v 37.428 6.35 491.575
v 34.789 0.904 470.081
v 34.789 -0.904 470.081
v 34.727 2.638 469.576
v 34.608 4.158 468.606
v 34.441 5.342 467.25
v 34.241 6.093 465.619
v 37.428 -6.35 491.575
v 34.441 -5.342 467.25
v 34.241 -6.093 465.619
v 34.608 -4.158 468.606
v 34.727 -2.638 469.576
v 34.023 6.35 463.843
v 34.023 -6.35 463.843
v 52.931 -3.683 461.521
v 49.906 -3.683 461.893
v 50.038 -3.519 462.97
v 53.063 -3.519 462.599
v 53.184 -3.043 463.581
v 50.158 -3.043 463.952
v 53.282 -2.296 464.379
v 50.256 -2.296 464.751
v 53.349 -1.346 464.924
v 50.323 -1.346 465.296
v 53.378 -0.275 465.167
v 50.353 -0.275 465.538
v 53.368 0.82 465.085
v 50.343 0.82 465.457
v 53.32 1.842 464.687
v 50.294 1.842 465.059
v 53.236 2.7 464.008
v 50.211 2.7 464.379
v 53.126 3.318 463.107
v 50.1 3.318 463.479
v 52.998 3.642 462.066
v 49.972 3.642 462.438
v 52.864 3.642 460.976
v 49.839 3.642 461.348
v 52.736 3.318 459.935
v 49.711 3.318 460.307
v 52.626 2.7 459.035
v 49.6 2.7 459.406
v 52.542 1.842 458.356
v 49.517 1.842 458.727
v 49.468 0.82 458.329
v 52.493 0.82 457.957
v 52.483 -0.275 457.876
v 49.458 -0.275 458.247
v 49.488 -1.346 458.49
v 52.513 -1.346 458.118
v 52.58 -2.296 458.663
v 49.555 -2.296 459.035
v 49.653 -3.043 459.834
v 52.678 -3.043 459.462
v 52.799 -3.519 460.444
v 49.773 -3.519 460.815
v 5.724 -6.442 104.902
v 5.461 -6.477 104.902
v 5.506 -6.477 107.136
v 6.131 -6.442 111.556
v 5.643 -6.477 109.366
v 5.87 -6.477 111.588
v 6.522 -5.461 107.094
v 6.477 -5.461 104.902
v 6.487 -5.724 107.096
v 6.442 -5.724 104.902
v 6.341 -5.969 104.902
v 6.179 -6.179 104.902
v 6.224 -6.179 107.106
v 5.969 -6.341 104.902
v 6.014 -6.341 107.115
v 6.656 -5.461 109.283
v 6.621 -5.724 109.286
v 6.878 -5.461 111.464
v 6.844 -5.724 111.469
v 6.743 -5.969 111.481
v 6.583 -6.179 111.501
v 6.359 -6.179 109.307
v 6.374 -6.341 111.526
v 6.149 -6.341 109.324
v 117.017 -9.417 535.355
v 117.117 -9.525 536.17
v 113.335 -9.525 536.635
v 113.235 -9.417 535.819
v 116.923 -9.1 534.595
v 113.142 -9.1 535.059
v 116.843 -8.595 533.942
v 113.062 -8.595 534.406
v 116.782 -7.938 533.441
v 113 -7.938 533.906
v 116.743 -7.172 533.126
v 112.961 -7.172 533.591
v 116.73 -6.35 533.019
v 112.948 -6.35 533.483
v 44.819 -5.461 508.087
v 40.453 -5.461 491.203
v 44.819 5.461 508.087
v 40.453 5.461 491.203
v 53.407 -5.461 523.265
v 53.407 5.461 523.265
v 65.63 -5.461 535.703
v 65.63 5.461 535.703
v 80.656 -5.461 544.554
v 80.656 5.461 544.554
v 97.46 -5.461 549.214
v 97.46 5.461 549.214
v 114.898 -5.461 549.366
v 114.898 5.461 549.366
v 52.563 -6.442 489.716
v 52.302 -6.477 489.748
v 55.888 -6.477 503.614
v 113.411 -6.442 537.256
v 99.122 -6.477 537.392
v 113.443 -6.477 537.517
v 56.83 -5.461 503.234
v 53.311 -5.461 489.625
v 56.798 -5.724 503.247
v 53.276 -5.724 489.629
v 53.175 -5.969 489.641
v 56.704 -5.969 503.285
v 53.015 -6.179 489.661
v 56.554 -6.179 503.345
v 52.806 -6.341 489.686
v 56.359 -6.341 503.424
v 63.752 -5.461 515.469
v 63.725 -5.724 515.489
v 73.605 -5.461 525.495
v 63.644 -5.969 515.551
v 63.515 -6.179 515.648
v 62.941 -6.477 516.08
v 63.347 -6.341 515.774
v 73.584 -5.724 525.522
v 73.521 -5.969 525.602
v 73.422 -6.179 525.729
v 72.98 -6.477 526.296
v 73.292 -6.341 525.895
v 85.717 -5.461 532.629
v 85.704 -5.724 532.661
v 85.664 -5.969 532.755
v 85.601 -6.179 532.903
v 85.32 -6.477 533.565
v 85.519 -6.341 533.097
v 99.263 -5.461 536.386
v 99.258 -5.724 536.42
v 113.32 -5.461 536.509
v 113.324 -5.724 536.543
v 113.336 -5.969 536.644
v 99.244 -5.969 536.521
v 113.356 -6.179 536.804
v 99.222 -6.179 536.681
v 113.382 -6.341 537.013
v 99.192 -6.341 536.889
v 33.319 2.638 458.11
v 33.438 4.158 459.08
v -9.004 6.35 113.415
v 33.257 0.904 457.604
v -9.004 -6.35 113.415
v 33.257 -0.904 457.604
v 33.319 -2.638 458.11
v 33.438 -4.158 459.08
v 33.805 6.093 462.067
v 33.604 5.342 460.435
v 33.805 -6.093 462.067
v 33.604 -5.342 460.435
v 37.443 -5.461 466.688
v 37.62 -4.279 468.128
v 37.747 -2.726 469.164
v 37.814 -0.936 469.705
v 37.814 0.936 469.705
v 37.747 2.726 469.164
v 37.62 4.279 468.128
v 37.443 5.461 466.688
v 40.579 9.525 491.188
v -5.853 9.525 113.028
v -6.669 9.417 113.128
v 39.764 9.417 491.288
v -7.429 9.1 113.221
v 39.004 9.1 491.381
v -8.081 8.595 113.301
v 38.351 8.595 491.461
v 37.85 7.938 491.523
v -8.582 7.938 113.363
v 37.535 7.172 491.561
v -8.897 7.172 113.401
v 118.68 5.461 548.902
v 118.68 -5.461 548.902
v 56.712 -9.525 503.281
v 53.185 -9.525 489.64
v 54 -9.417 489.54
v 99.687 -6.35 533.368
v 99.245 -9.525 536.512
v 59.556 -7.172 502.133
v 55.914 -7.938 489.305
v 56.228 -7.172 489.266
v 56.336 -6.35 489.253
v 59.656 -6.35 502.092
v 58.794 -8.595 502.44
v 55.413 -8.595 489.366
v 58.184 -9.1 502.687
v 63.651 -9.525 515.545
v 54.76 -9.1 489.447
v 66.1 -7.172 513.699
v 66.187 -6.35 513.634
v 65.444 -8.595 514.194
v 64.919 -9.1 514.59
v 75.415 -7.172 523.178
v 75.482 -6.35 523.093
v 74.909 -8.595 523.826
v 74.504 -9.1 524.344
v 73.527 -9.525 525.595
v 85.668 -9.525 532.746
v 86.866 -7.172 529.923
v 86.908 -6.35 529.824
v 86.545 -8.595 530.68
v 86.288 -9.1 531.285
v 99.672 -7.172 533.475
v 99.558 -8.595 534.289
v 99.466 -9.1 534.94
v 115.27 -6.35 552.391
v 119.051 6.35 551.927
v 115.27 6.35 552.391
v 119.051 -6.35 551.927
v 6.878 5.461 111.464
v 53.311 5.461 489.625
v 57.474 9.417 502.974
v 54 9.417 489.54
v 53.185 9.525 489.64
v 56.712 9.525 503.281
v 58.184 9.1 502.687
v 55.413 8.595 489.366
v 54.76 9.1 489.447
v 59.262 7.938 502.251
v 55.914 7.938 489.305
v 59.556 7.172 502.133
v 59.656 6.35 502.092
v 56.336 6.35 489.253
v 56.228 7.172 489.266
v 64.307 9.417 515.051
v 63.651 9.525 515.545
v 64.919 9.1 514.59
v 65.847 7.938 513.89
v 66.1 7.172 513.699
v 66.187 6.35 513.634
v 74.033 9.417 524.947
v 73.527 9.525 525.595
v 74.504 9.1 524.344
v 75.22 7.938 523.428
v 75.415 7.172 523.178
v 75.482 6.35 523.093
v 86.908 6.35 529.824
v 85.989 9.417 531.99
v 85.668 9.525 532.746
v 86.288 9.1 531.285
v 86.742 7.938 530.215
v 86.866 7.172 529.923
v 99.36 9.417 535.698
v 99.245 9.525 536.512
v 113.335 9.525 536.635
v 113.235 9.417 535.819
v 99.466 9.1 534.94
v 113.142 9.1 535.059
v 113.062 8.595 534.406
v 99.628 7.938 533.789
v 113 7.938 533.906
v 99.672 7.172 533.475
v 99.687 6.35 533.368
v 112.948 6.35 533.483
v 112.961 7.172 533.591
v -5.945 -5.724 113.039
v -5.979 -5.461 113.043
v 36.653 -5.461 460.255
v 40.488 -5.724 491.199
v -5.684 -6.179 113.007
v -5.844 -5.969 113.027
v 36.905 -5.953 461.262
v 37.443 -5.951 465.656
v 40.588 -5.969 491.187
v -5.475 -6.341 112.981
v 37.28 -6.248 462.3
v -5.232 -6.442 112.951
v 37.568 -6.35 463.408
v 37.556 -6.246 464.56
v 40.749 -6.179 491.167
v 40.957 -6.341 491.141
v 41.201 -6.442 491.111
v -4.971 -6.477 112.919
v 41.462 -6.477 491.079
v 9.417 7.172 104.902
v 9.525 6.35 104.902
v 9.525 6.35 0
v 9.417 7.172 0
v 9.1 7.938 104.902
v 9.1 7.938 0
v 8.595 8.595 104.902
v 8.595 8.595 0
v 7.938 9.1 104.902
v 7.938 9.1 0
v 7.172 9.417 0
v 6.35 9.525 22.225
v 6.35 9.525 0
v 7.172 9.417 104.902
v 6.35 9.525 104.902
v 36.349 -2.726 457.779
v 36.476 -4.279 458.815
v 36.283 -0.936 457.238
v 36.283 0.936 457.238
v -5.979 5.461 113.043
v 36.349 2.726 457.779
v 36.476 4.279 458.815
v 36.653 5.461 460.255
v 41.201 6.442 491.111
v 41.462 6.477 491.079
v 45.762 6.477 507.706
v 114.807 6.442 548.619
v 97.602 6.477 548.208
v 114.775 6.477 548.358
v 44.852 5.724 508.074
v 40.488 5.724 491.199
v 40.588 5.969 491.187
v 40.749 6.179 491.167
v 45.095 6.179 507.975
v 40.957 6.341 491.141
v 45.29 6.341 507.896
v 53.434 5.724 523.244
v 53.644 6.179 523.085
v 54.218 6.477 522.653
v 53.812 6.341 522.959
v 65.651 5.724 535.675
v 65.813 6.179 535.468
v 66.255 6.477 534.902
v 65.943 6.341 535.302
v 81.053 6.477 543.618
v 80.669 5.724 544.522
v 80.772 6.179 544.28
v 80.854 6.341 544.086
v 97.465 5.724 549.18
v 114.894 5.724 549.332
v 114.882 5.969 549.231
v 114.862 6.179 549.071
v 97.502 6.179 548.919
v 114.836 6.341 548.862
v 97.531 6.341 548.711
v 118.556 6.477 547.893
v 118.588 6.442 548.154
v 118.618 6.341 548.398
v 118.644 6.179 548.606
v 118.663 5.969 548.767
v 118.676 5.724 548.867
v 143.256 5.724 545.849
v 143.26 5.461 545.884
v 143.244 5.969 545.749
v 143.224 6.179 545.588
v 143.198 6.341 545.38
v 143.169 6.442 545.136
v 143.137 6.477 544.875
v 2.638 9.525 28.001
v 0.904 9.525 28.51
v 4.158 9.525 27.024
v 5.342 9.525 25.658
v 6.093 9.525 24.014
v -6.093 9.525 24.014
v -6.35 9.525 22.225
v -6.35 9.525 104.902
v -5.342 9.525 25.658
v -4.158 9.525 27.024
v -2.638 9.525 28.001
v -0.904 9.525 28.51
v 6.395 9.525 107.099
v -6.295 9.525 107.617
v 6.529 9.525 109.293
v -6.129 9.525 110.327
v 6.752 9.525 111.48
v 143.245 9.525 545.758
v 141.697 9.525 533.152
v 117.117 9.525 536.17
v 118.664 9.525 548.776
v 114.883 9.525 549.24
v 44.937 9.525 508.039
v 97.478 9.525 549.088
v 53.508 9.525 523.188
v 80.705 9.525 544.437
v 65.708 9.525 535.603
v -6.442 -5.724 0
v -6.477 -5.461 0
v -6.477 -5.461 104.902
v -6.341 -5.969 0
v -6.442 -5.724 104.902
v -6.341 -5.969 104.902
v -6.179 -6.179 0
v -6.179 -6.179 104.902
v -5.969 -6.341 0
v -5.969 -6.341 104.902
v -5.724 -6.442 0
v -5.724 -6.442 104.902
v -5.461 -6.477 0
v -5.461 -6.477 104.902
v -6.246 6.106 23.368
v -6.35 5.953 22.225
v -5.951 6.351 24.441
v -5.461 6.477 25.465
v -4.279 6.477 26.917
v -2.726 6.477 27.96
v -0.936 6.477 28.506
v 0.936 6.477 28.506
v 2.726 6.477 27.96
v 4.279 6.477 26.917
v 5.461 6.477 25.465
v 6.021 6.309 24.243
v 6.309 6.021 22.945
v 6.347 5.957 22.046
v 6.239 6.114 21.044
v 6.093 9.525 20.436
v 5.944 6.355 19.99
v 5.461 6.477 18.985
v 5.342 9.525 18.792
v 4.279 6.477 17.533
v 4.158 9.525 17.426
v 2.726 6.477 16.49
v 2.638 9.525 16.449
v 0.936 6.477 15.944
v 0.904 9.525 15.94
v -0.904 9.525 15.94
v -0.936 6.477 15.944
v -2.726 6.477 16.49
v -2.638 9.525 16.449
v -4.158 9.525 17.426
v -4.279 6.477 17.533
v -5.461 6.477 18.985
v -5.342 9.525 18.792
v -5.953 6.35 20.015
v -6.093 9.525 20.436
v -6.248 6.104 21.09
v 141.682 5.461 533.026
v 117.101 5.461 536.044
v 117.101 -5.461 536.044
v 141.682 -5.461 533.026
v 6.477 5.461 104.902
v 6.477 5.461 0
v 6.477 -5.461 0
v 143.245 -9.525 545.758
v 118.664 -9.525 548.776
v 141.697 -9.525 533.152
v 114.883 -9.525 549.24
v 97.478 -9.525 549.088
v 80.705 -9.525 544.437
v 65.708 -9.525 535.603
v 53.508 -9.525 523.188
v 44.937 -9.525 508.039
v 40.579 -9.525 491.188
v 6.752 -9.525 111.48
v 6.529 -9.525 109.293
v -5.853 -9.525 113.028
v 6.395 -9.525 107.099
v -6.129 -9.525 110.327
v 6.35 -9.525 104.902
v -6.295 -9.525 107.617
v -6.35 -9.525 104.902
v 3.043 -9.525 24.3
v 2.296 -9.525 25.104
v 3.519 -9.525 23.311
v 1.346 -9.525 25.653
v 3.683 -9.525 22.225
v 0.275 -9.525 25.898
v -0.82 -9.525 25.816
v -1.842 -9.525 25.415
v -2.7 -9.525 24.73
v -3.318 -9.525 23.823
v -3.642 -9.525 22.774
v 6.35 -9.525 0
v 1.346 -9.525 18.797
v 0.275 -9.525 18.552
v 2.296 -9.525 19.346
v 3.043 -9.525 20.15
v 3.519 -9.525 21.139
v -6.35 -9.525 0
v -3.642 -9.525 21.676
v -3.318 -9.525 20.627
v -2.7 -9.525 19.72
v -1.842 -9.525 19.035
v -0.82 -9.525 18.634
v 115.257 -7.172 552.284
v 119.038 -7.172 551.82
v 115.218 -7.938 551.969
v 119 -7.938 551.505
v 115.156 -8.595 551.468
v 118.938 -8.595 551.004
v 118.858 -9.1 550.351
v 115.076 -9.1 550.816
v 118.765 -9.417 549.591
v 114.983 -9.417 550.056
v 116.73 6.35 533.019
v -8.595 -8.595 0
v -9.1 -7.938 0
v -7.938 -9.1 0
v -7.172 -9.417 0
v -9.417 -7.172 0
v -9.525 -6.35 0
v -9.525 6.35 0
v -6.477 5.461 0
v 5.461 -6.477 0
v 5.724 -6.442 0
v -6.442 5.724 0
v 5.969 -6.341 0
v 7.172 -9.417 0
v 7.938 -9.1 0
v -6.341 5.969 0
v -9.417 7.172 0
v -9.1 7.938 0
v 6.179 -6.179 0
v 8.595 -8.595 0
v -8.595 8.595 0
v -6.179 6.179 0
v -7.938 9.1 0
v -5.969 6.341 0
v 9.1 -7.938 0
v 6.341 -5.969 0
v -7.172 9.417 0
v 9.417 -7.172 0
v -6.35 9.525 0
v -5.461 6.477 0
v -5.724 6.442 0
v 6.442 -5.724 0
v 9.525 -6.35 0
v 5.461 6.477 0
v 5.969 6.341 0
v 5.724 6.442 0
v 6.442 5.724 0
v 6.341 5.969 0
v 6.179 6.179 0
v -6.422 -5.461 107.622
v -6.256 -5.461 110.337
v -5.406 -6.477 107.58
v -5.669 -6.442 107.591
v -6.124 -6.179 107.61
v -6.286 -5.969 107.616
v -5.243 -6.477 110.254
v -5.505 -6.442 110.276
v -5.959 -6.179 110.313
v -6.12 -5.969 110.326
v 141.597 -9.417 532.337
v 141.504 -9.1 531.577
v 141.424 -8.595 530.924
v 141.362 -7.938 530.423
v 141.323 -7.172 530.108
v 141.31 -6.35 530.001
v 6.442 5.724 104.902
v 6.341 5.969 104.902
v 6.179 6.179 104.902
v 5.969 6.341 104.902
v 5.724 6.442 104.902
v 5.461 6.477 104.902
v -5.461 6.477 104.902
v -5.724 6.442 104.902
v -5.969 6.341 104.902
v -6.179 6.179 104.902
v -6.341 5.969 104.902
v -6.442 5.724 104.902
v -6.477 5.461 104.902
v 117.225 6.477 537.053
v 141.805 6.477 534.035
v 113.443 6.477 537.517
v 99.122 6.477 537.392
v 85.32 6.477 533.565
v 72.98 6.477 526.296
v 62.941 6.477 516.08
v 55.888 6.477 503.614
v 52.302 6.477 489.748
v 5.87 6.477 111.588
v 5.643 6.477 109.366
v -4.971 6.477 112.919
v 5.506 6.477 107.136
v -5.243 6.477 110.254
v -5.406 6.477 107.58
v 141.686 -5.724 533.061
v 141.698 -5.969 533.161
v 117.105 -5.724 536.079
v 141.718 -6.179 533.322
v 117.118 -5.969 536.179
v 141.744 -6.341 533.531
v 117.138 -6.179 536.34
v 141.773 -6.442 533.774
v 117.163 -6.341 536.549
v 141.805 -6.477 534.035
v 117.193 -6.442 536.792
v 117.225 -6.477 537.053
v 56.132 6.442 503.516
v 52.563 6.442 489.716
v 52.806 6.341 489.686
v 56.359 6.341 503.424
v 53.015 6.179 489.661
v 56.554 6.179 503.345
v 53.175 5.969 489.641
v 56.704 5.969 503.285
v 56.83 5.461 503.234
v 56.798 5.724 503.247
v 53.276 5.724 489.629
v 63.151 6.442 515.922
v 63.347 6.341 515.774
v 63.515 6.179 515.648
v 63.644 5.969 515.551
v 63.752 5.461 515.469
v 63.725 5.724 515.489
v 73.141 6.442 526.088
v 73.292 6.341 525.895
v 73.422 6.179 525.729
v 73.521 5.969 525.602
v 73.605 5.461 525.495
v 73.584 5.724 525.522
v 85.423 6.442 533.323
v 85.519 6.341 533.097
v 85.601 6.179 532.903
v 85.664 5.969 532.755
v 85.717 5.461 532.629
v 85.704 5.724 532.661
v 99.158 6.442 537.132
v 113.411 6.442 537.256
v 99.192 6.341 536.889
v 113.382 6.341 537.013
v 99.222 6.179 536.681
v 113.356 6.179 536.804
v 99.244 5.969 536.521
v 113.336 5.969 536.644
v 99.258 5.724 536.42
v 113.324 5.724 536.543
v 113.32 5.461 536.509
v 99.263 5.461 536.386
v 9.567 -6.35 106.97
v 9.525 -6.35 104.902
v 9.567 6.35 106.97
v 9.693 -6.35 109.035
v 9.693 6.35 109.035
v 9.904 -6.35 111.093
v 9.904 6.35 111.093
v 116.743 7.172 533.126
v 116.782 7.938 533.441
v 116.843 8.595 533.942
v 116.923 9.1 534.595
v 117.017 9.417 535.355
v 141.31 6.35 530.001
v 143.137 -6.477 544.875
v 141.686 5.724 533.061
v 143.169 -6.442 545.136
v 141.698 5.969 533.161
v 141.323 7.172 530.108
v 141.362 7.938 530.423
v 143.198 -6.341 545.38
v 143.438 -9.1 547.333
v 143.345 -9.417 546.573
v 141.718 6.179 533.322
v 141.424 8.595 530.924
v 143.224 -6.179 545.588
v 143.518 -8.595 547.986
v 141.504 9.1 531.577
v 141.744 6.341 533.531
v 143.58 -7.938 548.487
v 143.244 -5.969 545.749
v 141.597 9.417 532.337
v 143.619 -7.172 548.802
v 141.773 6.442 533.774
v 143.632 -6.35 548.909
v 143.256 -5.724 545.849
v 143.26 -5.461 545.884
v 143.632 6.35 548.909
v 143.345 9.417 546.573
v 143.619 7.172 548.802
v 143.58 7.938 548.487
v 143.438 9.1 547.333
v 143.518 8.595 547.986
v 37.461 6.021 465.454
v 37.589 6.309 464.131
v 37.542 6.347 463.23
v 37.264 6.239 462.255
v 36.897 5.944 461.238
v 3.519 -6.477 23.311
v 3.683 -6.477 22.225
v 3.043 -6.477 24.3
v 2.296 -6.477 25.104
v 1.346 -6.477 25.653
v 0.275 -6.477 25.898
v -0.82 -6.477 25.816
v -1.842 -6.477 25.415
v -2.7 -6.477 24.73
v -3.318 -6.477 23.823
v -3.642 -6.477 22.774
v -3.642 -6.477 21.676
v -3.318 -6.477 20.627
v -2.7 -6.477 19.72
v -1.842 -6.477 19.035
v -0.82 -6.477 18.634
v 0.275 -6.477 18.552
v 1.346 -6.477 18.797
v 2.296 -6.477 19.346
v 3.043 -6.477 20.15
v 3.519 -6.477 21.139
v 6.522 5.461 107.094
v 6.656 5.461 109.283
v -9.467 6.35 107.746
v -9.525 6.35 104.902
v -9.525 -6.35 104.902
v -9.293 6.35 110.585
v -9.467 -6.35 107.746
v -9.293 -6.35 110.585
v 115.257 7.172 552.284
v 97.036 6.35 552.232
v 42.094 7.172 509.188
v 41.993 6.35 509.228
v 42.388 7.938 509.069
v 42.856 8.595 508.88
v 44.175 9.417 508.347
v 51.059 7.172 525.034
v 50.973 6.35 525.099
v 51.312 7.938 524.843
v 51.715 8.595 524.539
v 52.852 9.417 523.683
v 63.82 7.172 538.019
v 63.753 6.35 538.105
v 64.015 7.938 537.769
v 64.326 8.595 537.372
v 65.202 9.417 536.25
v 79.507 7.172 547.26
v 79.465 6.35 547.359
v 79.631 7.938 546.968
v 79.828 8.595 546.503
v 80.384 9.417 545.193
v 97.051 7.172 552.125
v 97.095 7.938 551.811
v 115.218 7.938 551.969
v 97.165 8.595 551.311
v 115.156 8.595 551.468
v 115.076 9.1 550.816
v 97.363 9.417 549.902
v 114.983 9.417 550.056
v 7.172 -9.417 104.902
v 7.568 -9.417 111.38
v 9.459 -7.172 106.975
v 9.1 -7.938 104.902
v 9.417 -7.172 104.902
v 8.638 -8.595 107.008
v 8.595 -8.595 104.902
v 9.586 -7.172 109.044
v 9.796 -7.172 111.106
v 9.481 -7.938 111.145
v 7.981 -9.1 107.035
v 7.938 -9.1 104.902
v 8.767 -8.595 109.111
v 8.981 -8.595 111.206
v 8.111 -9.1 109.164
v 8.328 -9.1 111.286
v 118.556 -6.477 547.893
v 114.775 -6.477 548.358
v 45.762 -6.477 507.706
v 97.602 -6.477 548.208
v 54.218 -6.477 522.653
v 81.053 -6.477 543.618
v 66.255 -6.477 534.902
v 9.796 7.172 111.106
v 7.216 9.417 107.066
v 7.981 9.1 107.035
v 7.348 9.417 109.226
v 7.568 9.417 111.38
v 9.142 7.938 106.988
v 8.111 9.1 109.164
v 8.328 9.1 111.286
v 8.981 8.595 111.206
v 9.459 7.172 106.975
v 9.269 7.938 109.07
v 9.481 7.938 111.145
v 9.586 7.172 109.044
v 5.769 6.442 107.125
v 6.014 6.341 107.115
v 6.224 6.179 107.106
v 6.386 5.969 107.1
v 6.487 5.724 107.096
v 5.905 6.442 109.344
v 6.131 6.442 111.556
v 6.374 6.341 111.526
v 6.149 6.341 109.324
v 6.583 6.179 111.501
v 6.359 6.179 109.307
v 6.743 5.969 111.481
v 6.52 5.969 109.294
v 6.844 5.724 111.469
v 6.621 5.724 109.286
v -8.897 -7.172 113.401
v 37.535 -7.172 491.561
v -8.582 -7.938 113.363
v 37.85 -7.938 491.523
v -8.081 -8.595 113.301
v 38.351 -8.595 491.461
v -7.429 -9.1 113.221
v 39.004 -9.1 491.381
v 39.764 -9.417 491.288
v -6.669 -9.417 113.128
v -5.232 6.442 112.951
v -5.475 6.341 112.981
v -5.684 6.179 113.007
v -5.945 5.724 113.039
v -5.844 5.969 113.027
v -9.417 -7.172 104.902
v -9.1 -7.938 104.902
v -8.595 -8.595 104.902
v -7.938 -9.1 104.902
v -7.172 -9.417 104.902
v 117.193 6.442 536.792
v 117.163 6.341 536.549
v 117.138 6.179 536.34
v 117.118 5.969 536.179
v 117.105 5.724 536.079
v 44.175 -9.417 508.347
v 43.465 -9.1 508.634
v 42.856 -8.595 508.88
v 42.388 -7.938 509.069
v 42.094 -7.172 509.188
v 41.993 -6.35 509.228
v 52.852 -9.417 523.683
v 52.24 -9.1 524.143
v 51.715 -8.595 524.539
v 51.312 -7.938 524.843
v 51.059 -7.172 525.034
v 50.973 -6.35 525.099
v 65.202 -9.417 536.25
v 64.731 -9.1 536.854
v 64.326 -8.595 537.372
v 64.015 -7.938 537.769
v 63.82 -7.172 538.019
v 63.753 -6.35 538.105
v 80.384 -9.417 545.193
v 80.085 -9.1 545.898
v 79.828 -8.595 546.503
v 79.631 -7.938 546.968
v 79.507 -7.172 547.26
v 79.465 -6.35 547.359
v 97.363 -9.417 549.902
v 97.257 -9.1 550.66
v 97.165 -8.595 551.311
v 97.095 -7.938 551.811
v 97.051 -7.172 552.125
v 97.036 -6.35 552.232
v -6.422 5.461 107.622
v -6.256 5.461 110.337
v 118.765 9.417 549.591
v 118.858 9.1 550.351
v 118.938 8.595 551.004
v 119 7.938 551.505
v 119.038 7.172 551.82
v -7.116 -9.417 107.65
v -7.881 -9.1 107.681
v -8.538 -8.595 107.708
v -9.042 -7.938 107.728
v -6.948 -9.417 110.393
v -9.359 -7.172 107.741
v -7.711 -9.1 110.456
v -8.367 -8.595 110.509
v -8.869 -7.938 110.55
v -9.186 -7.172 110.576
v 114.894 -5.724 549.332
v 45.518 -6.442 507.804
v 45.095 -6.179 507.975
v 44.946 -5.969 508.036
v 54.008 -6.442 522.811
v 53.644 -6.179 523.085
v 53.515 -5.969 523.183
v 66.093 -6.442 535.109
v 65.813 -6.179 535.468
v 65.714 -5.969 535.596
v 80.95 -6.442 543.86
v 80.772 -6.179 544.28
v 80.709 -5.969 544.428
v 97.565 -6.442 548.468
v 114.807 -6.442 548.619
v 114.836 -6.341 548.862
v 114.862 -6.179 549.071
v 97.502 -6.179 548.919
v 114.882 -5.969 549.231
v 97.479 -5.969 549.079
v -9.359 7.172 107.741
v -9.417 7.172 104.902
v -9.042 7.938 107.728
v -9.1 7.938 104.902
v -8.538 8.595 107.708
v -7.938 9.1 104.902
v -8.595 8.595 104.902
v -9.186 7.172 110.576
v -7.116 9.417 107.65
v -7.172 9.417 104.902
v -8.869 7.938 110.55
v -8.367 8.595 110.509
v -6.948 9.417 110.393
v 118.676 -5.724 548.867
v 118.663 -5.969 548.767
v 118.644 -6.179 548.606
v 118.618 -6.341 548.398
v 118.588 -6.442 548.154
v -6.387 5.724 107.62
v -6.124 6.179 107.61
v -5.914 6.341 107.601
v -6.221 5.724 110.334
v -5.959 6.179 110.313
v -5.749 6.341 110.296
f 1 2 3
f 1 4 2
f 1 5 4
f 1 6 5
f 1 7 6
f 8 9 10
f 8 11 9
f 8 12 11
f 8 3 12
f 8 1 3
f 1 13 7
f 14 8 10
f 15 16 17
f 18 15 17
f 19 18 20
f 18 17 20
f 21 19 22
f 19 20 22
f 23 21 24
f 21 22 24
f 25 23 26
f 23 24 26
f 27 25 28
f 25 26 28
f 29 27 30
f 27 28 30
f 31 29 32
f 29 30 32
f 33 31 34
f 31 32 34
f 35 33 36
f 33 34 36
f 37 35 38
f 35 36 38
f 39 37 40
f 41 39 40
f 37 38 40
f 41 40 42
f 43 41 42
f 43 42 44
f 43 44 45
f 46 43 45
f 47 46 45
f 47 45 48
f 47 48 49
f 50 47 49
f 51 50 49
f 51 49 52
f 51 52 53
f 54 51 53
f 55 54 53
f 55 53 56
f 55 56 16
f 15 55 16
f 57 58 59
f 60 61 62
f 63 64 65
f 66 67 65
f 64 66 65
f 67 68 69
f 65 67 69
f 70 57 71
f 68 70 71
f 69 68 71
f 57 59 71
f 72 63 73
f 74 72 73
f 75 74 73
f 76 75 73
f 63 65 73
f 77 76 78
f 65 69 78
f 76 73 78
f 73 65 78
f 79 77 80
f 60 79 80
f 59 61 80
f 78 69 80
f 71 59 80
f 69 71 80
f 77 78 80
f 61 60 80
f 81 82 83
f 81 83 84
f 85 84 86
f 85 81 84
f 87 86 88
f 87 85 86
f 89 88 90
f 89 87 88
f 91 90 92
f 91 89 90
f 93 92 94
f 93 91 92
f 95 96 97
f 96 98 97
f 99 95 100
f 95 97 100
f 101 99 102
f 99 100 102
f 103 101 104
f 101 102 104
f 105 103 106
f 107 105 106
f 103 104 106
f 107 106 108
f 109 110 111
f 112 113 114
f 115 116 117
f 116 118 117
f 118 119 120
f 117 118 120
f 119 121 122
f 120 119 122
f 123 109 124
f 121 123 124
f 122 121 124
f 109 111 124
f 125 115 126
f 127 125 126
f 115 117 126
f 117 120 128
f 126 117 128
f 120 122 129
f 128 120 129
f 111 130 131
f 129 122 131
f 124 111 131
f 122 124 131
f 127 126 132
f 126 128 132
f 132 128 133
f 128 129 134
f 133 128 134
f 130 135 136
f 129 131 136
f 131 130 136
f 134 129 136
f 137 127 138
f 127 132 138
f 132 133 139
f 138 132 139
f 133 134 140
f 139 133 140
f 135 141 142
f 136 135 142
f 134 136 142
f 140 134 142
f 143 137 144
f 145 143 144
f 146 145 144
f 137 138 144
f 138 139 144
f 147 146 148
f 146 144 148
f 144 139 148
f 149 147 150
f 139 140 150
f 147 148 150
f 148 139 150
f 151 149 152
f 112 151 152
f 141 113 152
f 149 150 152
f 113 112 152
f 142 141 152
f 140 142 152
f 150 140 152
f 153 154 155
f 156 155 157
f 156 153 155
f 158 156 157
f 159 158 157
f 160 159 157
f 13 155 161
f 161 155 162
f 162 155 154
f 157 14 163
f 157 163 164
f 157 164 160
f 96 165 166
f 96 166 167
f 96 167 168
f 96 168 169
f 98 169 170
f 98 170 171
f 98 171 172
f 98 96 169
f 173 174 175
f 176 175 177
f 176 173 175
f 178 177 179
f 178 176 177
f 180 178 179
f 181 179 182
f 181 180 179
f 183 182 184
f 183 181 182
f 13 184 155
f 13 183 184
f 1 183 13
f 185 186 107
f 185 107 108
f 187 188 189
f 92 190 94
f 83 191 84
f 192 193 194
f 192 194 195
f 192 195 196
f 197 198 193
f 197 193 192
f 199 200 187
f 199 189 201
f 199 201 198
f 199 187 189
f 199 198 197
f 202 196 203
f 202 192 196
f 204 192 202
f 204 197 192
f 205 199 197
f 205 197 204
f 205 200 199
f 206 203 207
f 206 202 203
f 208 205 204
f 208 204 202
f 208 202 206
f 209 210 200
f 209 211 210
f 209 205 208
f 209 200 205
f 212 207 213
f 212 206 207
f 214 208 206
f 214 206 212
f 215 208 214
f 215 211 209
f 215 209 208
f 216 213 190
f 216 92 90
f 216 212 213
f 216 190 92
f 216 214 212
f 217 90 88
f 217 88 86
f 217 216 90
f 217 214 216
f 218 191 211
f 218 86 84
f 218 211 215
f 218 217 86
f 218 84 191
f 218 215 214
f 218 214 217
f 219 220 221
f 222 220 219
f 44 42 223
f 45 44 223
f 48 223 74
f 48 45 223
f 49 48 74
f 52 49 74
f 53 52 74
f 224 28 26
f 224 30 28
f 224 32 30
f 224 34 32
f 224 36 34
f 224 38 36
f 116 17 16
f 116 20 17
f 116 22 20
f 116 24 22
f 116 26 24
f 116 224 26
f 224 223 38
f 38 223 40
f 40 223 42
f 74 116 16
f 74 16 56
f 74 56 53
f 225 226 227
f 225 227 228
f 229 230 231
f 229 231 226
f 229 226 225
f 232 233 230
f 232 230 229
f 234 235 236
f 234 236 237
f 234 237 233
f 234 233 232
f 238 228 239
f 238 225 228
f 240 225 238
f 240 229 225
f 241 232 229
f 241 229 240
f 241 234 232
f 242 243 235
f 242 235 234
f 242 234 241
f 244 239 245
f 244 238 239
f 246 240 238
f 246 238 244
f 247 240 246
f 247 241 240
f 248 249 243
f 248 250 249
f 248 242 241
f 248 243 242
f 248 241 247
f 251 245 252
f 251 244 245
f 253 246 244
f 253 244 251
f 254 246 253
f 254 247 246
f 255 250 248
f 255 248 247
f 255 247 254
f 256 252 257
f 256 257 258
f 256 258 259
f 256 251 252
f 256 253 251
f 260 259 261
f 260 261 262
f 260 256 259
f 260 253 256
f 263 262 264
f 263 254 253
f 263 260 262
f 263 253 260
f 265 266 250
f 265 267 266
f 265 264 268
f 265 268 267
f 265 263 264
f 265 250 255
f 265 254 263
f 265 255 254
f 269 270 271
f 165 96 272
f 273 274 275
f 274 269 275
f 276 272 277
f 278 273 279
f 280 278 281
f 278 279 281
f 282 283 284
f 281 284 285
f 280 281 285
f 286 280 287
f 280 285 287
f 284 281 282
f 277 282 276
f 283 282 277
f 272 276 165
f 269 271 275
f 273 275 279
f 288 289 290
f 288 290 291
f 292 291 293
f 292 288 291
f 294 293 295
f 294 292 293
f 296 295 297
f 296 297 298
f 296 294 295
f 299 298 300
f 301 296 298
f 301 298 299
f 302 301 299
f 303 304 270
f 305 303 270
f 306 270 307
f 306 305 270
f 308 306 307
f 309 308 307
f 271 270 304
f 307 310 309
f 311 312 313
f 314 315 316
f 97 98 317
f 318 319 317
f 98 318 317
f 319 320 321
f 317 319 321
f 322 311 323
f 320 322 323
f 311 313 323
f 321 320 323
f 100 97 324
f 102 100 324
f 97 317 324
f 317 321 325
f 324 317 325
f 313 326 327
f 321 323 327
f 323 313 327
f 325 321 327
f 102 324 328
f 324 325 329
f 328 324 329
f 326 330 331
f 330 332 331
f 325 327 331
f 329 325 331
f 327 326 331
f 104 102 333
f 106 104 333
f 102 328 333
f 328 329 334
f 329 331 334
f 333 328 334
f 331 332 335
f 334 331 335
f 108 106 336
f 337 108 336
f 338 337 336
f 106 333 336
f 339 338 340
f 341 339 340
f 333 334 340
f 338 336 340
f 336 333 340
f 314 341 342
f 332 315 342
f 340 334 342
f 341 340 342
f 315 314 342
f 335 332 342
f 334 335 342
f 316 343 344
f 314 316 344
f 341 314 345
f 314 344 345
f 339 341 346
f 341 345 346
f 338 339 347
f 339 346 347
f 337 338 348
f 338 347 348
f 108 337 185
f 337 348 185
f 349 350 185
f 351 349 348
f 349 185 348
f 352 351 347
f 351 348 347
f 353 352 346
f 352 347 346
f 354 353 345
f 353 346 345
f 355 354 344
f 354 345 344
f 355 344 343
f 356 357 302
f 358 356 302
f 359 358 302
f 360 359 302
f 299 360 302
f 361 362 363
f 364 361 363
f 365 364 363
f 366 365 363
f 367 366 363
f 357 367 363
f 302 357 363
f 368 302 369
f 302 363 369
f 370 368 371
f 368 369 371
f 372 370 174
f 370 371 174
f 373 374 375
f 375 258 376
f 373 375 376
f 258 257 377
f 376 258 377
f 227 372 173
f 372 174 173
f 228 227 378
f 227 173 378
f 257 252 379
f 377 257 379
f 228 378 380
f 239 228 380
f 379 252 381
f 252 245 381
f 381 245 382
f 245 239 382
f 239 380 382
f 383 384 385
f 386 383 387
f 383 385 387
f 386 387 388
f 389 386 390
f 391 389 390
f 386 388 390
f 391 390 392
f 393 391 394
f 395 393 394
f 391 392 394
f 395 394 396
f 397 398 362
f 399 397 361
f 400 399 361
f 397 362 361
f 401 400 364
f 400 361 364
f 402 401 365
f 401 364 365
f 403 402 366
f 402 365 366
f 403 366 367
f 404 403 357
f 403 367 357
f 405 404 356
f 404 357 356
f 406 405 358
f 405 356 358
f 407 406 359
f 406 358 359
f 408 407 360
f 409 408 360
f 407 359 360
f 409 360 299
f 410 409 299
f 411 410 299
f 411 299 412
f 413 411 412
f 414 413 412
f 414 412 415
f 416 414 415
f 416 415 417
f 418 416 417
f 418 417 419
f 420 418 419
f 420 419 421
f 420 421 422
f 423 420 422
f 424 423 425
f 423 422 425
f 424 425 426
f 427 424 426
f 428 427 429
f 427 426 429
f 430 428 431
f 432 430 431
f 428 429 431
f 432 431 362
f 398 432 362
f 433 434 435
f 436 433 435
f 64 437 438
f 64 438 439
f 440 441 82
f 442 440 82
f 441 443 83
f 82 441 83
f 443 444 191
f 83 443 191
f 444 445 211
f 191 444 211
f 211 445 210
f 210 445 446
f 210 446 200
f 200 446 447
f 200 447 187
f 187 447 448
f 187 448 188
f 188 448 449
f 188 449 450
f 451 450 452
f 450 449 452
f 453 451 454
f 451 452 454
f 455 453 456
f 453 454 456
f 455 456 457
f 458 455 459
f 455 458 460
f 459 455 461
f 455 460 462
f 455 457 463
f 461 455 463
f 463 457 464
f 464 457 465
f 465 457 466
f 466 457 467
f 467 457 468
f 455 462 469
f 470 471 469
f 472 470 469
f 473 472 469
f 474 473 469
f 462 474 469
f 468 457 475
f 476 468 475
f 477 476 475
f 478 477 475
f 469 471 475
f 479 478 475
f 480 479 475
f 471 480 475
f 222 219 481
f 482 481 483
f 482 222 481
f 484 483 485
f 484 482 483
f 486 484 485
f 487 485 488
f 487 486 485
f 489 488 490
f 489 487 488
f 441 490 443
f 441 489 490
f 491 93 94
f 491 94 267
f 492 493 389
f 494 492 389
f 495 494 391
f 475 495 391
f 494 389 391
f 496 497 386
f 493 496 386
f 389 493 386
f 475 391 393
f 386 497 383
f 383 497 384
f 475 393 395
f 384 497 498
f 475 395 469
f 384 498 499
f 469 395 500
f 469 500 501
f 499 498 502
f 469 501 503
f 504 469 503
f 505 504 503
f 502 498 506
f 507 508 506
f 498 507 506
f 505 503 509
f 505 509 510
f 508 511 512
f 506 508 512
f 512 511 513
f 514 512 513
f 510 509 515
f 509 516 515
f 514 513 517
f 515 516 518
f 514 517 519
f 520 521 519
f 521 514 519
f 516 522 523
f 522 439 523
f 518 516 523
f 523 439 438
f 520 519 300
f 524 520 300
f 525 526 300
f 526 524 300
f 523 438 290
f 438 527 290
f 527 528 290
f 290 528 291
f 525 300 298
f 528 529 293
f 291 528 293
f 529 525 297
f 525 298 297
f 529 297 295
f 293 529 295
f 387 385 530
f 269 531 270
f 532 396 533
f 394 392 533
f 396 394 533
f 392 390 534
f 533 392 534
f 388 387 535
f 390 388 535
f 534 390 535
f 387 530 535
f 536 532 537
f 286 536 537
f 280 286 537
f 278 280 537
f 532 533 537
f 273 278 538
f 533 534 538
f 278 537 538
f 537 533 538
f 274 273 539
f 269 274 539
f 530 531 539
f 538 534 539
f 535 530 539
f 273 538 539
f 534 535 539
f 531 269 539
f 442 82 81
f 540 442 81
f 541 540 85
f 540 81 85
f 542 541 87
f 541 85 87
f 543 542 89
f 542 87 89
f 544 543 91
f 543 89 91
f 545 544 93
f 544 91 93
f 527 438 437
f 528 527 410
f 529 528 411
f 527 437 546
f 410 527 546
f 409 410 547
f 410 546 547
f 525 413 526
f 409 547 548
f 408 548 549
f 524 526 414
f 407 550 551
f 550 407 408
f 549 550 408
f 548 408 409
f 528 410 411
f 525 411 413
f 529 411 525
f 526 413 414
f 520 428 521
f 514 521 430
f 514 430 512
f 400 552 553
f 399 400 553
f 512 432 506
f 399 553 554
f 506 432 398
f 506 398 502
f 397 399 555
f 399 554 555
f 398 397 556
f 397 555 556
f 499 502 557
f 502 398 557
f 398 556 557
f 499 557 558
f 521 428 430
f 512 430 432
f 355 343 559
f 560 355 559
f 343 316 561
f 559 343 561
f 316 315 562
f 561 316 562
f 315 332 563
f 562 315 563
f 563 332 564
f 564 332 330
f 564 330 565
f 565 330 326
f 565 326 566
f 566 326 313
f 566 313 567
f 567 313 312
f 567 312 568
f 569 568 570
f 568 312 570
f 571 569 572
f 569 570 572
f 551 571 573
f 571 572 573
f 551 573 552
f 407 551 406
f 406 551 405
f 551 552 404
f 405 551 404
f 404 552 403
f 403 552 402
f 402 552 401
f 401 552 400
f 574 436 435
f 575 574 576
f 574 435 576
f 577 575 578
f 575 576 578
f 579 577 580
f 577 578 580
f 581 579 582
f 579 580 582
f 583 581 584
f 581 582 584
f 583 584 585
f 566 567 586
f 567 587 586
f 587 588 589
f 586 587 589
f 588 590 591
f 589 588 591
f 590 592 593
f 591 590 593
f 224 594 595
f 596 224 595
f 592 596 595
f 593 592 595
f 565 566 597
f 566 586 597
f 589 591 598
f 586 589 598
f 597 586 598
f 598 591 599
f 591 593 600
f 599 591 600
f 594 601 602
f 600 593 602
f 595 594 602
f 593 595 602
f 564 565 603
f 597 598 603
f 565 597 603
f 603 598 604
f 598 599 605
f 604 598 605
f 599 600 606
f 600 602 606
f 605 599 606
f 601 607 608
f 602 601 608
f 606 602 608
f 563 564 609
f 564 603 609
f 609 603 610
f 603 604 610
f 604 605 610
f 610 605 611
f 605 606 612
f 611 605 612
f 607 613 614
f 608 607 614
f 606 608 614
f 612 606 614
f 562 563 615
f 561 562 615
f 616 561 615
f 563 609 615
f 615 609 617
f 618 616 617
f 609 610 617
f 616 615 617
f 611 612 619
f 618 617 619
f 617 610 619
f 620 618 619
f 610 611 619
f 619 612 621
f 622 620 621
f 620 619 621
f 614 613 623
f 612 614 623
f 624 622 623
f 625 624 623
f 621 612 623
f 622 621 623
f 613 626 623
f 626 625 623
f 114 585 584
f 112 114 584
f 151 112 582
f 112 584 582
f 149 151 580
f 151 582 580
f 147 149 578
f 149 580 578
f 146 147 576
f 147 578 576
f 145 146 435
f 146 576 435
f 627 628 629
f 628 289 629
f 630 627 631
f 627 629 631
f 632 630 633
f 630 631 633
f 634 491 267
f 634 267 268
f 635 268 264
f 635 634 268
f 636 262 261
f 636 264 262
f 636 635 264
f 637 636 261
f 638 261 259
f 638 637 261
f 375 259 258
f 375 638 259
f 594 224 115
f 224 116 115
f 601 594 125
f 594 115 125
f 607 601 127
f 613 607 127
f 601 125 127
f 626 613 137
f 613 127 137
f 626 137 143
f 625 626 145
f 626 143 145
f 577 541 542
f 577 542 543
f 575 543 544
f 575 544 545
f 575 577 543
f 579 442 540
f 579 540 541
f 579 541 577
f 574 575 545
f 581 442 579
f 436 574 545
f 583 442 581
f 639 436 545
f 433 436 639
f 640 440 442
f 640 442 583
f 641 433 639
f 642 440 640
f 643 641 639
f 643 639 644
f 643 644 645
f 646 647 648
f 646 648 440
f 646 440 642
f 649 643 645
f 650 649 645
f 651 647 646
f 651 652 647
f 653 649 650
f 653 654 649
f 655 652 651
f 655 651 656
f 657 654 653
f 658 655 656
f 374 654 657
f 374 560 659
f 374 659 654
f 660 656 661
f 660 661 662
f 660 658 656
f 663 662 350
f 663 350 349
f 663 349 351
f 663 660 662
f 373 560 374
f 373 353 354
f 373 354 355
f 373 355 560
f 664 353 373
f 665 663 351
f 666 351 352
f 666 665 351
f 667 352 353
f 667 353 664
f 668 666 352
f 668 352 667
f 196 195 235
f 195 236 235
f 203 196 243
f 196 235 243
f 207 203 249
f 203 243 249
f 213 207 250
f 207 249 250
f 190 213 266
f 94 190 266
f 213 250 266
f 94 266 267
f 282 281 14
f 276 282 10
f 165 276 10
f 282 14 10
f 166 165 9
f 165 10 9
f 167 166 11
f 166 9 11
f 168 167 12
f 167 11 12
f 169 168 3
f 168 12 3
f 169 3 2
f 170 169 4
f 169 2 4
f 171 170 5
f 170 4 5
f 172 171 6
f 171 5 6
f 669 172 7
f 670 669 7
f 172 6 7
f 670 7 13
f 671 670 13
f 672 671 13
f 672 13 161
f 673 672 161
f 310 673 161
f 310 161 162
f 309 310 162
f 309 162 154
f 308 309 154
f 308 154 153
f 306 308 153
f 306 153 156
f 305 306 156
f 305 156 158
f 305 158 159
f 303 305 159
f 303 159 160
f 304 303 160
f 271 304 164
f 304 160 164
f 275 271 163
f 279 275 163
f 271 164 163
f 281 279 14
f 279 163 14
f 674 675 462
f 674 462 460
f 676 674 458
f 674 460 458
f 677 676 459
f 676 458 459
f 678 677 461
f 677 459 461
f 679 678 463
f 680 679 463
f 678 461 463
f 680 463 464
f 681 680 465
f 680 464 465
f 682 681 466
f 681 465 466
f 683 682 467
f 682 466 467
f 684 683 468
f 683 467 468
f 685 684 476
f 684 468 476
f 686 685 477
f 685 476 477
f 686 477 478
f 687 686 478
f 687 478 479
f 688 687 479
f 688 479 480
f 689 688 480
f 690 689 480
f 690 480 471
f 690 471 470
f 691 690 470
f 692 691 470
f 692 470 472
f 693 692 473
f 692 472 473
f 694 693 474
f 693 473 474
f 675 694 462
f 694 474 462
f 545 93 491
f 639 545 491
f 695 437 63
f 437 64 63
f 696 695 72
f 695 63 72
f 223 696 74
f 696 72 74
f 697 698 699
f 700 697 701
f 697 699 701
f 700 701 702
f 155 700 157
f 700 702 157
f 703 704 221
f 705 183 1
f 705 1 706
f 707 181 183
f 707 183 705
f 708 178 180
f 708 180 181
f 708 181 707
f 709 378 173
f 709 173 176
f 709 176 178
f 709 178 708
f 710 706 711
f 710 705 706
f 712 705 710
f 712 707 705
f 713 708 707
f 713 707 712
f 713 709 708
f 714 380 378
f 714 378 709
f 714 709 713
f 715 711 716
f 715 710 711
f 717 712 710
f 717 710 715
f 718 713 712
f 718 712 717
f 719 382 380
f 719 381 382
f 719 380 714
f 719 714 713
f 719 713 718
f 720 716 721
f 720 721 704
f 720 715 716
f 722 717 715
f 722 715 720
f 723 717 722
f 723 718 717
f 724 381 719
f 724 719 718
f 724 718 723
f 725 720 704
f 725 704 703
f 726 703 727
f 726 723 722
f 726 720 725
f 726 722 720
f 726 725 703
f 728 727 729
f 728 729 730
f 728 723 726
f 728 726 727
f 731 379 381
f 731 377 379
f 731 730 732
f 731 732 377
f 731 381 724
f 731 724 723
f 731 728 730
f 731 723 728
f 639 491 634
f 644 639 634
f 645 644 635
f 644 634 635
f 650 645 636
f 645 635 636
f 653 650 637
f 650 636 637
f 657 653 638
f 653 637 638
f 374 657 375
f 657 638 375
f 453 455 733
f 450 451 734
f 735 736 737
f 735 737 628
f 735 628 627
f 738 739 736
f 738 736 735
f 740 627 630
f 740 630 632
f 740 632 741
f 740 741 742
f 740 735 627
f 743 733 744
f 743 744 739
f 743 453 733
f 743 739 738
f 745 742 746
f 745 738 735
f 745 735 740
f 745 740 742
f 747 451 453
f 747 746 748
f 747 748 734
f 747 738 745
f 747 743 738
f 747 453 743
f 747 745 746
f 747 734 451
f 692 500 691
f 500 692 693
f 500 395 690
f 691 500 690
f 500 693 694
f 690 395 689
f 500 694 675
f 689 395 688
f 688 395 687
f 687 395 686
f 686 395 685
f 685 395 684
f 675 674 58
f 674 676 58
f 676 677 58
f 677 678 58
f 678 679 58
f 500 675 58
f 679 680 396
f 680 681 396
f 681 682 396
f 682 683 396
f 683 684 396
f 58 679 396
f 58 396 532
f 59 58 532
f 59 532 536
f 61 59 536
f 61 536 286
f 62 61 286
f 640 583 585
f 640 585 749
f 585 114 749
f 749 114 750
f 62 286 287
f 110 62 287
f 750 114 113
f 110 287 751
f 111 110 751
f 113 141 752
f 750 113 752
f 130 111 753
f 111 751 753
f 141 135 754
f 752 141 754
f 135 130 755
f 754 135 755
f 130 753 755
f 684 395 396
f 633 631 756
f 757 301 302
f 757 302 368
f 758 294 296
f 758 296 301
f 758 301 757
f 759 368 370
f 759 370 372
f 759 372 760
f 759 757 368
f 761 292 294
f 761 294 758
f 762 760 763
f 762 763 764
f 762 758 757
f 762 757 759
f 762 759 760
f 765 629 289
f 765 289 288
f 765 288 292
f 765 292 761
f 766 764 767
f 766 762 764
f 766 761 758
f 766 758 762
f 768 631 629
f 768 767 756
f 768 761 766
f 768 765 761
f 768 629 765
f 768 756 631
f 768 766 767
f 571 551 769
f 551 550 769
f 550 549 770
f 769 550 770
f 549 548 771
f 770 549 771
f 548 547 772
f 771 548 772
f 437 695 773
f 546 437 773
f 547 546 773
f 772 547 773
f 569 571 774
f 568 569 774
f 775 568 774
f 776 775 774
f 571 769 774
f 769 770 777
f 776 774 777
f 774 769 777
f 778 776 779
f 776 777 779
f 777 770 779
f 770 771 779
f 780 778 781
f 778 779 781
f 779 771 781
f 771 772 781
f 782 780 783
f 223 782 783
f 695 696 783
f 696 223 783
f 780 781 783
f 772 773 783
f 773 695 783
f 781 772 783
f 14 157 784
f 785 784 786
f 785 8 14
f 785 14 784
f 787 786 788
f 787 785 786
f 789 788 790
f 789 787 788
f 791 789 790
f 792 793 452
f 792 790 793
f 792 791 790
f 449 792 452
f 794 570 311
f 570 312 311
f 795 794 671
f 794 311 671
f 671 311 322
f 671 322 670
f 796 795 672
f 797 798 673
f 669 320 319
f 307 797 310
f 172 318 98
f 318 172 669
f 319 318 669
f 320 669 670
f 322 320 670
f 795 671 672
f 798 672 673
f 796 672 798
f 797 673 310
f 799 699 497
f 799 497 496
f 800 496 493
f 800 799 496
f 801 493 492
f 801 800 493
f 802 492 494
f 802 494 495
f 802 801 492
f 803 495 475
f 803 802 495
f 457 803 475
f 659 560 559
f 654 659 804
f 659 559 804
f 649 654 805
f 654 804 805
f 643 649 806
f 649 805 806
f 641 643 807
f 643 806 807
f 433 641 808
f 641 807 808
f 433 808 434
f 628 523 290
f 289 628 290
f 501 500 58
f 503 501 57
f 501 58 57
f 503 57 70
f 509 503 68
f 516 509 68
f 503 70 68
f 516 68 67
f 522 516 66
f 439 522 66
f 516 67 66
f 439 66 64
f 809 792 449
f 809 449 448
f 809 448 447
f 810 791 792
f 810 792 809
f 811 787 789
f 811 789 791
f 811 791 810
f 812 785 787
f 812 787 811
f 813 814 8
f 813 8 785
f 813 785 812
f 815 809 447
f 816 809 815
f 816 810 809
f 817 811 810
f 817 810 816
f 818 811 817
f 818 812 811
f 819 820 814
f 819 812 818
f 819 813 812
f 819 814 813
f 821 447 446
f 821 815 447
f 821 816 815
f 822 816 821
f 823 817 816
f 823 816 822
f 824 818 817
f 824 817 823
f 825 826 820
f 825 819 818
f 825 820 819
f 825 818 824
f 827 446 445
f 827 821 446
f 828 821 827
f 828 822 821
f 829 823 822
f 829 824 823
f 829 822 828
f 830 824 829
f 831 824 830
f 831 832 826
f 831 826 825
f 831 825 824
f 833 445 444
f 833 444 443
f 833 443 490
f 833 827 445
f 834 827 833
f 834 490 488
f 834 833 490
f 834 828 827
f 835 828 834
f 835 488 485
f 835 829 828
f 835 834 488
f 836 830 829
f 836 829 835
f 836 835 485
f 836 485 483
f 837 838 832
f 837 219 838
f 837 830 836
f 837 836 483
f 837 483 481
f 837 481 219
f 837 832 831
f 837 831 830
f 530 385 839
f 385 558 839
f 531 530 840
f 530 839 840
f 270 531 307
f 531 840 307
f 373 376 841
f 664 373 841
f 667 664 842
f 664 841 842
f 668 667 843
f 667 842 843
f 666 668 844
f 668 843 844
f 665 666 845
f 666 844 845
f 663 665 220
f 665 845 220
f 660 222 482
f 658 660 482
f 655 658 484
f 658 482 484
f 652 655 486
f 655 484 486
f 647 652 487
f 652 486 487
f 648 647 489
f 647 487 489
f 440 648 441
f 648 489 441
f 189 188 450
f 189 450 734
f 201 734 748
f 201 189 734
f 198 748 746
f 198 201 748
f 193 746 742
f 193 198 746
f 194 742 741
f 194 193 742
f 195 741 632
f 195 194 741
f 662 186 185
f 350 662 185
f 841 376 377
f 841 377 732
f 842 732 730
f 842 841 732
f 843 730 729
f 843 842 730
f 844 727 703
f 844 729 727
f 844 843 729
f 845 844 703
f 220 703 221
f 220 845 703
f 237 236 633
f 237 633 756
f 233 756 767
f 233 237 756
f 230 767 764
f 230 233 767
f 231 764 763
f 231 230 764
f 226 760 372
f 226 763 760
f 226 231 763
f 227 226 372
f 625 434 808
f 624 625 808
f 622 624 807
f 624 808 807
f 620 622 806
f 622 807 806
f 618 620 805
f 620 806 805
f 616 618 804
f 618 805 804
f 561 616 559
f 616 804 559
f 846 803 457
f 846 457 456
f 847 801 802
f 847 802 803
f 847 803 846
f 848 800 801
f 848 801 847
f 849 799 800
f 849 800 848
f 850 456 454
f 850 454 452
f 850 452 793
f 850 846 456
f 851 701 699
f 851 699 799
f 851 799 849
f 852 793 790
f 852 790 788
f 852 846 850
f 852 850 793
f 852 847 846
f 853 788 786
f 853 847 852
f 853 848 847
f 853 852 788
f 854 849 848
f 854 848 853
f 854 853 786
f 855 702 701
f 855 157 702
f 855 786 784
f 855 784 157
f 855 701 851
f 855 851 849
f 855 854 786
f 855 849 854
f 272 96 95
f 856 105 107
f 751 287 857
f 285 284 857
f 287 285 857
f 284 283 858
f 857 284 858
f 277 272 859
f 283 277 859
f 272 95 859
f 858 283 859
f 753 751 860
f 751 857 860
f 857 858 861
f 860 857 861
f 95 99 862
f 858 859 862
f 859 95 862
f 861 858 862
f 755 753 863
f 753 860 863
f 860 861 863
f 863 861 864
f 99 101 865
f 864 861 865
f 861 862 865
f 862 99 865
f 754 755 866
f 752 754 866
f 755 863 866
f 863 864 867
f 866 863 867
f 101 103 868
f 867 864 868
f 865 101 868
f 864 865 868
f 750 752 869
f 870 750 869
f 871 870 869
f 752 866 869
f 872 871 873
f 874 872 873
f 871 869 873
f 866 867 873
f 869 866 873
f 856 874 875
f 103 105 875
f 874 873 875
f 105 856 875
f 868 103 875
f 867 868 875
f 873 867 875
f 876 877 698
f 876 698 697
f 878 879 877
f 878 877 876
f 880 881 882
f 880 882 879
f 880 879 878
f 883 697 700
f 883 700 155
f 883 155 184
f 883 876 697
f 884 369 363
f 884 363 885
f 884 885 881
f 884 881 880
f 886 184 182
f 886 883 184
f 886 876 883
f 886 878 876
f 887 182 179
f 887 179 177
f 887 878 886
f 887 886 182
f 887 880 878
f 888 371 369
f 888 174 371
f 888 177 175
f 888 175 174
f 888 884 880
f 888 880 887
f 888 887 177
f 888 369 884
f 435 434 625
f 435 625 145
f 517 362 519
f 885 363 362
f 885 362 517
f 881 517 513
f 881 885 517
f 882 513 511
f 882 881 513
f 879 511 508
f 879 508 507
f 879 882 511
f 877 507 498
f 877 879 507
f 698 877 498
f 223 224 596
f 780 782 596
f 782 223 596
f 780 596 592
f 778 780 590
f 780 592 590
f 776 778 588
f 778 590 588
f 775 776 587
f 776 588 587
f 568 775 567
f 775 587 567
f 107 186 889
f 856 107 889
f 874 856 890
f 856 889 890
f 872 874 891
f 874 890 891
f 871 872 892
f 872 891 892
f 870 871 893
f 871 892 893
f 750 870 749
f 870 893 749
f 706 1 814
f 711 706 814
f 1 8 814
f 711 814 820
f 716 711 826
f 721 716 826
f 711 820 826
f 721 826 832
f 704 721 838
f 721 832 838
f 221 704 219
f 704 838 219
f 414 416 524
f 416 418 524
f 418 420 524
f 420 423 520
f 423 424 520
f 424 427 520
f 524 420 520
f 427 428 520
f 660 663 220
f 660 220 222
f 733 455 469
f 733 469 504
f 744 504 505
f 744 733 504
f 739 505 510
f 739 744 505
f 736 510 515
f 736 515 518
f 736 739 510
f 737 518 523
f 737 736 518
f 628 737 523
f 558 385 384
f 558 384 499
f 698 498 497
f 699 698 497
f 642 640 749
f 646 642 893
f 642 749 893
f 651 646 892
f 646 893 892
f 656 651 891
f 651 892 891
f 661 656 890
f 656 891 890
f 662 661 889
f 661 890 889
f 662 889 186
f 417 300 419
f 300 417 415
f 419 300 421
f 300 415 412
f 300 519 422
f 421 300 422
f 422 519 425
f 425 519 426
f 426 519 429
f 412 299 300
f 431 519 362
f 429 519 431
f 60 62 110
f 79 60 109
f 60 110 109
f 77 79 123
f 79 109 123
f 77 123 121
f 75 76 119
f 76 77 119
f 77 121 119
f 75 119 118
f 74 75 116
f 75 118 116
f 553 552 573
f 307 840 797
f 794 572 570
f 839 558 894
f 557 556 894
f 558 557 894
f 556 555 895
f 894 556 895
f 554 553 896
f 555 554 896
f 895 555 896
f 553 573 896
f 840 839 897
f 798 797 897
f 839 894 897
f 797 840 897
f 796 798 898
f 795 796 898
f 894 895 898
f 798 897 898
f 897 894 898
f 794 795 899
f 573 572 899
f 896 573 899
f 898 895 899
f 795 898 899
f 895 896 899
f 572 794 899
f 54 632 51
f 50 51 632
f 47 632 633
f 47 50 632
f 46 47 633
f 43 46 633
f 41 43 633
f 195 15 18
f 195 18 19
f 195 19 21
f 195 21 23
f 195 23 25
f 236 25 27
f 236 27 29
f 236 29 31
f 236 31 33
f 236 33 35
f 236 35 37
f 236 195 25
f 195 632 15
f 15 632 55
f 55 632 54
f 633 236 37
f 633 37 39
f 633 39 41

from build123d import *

# Parameters (mm, degrees)
F4_R      = 3.683
F5_DEPTH  = 334.01
F6_R      = 3.683
F7_DEPTH  = 25.4
F8_R      = 6.35
F9_DEPTH  = 9.4742
F11_DEPTH = 24.765
F12_R     = 6.35
F13_DEPTH = 12.446


# Not quite as in the source:
# - a feature names something its author has since deleted; it is built from what else it names


with BuildPart() as f2:
    # F2: sweep along a path in F0
    with BuildLine(Plane.XZ) as f2_path:
        Line((0, 0), (0, 104.902))
        ThreePointArc((0, 104.902), (0.1125182852, 108.5847531474), (0.4496534022, 112.2537681409))
        Line((0.4496534022, 112.2537681409), (46.8818732396, 490.4138519163))
        ThreePointArc((46.8818732396, 490.4138519163), (69.6174413383, 530.5988324867), (114.1089879783, 542.9374303731))
        Line((114.1089879783, 542.9374303731), (117.890588816, 542.4731081747))
    # F1 (on Top) → F2 (sweep)
    with BuildSketch(Plane.XY):
        with BuildLine():
            ThreePointArc((-9.525, -6.35), (-8.5950640303, -8.5950640303), (-6.35, -9.525))
            Line((-6.35, -9.525), (6.35, -9.525))
            ThreePointArc((6.35, -9.525), (8.5950640303, -8.5950640303), (9.525, -6.35))
            Line((9.525, -6.35), (9.525, 6.35))
            ThreePointArc((9.525, 6.35), (8.5950640303, 8.5950640303), (6.35, 9.525))
            Line((6.35, 9.525), (-6.35, 9.525))
            ThreePointArc((-6.35, 9.525), (-8.5950640303, 8.5950640303), (-9.525, 6.35))
            Line((-9.525, 6.35), (-9.525, -6.35))
        make_face()
        with BuildLine():
            Line((5.461, -6.477), (-5.461, -6.477))
            ThreePointArc((-5.461, -6.477), (-6.1794204897, -6.1794204897), (-6.477, -5.461))
            Line((-6.477, -5.461), (-6.477, 5.461))
            ThreePointArc((-6.477, 5.461), (-6.1794204897, 6.1794204897), (-5.461, 6.477))
            Line((-5.461, 6.477), (5.461, 6.477))
            ThreePointArc((5.461, 6.477), (6.1794204897, 6.1794204897), (6.477, 5.461))
            Line((6.477, 5.461), (6.477, -5.461))
            ThreePointArc((6.477, -5.461), (6.1794204897, -6.1794204897), (5.461, -6.477))
        make_face(mode=Mode.SUBTRACT)
    sweep(path=f2_path.line)

    # F4 (on Front) → F5 (cut, symmetric)
    with BuildSketch(Plane.XZ):
        with Locations((0, 22.225)):
            Circle(F4_R)
    extrude(amount=F5_DEPTH, both=True, mode=Mode.SUBTRACT)

    # F6 (on face) → F7 (cut)
    with BuildSketch(Plane(origin=(-22.5893491944, 0, 2.7736233219), x_dir=(0, -1, 0), z_dir=(-0.9925461516, 0, 0.1218693434))):
        with Locations((0, 464.5318445404)):
            Circle(F6_R)
    extrude(amount=-F7_DEPTH, mode=Mode.SUBTRACT)

    # F8 (on face) → F9 (cut)
    with BuildSketch(Plane(origin=(-22.5893491944, 0, 2.7736233219), x_dir=(0, -1, 0), z_dir=(-0.9925461516, 0, 0.1218693434))):
        with Locations((0, 464.5318445404)):
            Circle(F8_R)
    extrude(amount=-F9_DEPTH, mode=Mode.SUBTRACT)

    # F10 (on face) → F11 (join)
    with BuildSketch(Plane(origin=(50.5216003355, 0, -6.2032725133), x_dir=(0, 1, 0), z_dir=(0.9925461516, 0, -0.1218693434))):
        with BuildLine():
            ThreePointArc((9.525, 559.1468445404), (8.5950640303, 561.3919085707), (6.35, 562.3218445404))
            Line((6.35, 562.3218445404), (-6.35, 562.3218445404))
            ThreePointArc((-6.35, 562.3218445404), (-8.5950640303, 561.3919085707), (-9.525, 559.1468445404))
            Line((-9.525, 559.1468445404), (-9.525, 546.4468445404))
            ThreePointArc((-9.525, 546.4468445404), (-8.5950640303, 544.2017805101), (-6.35, 543.2718445404))
            Line((-6.35, 543.2718445404), (6.35, 543.2718445404))
            ThreePointArc((6.35, 543.2718445404), (8.5950640303, 544.2017805101), (9.525, 546.4468445404))
            Line((9.525, 546.4468445404), (9.525, 559.1468445404))
        make_face()
        with BuildLine():
            ThreePointArc((-6.477, 558.2578445404), (-6.1794204897, 558.9762650301), (-5.461, 559.2738445404))
            Line((-5.461, 559.2738445404), (5.461, 559.2738445404))
            ThreePointArc((5.461, 559.2738445404), (6.1794204897, 558.9762650301), (6.477, 558.2578445404))
            Line((6.477, 558.2578445404), (6.477, 547.3358445404))
            ThreePointArc((6.477, 547.3358445404), (6.1794204897, 546.6174240507), (5.461, 546.3198445404))
            Line((5.461, 546.3198445404), (-5.461, 546.3198445404))
            ThreePointArc((-5.461, 546.3198445404), (-6.1794204897, 546.6174240507), (-6.477, 547.3358445404))
            Line((-6.477, 547.3358445404), (-6.477, 558.2578445404))
        make_face(mode=Mode.SUBTRACT)
    extrude(amount=F11_DEPTH)

    # F12 (on face) → F13 (cut)
    with BuildSketch(Plane(origin=(0, 9.525, 0), x_dir=(-1, 0, 0), z_dir=(0, 1, 0))):
        with Locations((0, 22.225)):
            Circle(F12_R)
    extrude(amount=-F13_DEPTH, mode=Mode.SUBTRACT)


solid = f2.part
